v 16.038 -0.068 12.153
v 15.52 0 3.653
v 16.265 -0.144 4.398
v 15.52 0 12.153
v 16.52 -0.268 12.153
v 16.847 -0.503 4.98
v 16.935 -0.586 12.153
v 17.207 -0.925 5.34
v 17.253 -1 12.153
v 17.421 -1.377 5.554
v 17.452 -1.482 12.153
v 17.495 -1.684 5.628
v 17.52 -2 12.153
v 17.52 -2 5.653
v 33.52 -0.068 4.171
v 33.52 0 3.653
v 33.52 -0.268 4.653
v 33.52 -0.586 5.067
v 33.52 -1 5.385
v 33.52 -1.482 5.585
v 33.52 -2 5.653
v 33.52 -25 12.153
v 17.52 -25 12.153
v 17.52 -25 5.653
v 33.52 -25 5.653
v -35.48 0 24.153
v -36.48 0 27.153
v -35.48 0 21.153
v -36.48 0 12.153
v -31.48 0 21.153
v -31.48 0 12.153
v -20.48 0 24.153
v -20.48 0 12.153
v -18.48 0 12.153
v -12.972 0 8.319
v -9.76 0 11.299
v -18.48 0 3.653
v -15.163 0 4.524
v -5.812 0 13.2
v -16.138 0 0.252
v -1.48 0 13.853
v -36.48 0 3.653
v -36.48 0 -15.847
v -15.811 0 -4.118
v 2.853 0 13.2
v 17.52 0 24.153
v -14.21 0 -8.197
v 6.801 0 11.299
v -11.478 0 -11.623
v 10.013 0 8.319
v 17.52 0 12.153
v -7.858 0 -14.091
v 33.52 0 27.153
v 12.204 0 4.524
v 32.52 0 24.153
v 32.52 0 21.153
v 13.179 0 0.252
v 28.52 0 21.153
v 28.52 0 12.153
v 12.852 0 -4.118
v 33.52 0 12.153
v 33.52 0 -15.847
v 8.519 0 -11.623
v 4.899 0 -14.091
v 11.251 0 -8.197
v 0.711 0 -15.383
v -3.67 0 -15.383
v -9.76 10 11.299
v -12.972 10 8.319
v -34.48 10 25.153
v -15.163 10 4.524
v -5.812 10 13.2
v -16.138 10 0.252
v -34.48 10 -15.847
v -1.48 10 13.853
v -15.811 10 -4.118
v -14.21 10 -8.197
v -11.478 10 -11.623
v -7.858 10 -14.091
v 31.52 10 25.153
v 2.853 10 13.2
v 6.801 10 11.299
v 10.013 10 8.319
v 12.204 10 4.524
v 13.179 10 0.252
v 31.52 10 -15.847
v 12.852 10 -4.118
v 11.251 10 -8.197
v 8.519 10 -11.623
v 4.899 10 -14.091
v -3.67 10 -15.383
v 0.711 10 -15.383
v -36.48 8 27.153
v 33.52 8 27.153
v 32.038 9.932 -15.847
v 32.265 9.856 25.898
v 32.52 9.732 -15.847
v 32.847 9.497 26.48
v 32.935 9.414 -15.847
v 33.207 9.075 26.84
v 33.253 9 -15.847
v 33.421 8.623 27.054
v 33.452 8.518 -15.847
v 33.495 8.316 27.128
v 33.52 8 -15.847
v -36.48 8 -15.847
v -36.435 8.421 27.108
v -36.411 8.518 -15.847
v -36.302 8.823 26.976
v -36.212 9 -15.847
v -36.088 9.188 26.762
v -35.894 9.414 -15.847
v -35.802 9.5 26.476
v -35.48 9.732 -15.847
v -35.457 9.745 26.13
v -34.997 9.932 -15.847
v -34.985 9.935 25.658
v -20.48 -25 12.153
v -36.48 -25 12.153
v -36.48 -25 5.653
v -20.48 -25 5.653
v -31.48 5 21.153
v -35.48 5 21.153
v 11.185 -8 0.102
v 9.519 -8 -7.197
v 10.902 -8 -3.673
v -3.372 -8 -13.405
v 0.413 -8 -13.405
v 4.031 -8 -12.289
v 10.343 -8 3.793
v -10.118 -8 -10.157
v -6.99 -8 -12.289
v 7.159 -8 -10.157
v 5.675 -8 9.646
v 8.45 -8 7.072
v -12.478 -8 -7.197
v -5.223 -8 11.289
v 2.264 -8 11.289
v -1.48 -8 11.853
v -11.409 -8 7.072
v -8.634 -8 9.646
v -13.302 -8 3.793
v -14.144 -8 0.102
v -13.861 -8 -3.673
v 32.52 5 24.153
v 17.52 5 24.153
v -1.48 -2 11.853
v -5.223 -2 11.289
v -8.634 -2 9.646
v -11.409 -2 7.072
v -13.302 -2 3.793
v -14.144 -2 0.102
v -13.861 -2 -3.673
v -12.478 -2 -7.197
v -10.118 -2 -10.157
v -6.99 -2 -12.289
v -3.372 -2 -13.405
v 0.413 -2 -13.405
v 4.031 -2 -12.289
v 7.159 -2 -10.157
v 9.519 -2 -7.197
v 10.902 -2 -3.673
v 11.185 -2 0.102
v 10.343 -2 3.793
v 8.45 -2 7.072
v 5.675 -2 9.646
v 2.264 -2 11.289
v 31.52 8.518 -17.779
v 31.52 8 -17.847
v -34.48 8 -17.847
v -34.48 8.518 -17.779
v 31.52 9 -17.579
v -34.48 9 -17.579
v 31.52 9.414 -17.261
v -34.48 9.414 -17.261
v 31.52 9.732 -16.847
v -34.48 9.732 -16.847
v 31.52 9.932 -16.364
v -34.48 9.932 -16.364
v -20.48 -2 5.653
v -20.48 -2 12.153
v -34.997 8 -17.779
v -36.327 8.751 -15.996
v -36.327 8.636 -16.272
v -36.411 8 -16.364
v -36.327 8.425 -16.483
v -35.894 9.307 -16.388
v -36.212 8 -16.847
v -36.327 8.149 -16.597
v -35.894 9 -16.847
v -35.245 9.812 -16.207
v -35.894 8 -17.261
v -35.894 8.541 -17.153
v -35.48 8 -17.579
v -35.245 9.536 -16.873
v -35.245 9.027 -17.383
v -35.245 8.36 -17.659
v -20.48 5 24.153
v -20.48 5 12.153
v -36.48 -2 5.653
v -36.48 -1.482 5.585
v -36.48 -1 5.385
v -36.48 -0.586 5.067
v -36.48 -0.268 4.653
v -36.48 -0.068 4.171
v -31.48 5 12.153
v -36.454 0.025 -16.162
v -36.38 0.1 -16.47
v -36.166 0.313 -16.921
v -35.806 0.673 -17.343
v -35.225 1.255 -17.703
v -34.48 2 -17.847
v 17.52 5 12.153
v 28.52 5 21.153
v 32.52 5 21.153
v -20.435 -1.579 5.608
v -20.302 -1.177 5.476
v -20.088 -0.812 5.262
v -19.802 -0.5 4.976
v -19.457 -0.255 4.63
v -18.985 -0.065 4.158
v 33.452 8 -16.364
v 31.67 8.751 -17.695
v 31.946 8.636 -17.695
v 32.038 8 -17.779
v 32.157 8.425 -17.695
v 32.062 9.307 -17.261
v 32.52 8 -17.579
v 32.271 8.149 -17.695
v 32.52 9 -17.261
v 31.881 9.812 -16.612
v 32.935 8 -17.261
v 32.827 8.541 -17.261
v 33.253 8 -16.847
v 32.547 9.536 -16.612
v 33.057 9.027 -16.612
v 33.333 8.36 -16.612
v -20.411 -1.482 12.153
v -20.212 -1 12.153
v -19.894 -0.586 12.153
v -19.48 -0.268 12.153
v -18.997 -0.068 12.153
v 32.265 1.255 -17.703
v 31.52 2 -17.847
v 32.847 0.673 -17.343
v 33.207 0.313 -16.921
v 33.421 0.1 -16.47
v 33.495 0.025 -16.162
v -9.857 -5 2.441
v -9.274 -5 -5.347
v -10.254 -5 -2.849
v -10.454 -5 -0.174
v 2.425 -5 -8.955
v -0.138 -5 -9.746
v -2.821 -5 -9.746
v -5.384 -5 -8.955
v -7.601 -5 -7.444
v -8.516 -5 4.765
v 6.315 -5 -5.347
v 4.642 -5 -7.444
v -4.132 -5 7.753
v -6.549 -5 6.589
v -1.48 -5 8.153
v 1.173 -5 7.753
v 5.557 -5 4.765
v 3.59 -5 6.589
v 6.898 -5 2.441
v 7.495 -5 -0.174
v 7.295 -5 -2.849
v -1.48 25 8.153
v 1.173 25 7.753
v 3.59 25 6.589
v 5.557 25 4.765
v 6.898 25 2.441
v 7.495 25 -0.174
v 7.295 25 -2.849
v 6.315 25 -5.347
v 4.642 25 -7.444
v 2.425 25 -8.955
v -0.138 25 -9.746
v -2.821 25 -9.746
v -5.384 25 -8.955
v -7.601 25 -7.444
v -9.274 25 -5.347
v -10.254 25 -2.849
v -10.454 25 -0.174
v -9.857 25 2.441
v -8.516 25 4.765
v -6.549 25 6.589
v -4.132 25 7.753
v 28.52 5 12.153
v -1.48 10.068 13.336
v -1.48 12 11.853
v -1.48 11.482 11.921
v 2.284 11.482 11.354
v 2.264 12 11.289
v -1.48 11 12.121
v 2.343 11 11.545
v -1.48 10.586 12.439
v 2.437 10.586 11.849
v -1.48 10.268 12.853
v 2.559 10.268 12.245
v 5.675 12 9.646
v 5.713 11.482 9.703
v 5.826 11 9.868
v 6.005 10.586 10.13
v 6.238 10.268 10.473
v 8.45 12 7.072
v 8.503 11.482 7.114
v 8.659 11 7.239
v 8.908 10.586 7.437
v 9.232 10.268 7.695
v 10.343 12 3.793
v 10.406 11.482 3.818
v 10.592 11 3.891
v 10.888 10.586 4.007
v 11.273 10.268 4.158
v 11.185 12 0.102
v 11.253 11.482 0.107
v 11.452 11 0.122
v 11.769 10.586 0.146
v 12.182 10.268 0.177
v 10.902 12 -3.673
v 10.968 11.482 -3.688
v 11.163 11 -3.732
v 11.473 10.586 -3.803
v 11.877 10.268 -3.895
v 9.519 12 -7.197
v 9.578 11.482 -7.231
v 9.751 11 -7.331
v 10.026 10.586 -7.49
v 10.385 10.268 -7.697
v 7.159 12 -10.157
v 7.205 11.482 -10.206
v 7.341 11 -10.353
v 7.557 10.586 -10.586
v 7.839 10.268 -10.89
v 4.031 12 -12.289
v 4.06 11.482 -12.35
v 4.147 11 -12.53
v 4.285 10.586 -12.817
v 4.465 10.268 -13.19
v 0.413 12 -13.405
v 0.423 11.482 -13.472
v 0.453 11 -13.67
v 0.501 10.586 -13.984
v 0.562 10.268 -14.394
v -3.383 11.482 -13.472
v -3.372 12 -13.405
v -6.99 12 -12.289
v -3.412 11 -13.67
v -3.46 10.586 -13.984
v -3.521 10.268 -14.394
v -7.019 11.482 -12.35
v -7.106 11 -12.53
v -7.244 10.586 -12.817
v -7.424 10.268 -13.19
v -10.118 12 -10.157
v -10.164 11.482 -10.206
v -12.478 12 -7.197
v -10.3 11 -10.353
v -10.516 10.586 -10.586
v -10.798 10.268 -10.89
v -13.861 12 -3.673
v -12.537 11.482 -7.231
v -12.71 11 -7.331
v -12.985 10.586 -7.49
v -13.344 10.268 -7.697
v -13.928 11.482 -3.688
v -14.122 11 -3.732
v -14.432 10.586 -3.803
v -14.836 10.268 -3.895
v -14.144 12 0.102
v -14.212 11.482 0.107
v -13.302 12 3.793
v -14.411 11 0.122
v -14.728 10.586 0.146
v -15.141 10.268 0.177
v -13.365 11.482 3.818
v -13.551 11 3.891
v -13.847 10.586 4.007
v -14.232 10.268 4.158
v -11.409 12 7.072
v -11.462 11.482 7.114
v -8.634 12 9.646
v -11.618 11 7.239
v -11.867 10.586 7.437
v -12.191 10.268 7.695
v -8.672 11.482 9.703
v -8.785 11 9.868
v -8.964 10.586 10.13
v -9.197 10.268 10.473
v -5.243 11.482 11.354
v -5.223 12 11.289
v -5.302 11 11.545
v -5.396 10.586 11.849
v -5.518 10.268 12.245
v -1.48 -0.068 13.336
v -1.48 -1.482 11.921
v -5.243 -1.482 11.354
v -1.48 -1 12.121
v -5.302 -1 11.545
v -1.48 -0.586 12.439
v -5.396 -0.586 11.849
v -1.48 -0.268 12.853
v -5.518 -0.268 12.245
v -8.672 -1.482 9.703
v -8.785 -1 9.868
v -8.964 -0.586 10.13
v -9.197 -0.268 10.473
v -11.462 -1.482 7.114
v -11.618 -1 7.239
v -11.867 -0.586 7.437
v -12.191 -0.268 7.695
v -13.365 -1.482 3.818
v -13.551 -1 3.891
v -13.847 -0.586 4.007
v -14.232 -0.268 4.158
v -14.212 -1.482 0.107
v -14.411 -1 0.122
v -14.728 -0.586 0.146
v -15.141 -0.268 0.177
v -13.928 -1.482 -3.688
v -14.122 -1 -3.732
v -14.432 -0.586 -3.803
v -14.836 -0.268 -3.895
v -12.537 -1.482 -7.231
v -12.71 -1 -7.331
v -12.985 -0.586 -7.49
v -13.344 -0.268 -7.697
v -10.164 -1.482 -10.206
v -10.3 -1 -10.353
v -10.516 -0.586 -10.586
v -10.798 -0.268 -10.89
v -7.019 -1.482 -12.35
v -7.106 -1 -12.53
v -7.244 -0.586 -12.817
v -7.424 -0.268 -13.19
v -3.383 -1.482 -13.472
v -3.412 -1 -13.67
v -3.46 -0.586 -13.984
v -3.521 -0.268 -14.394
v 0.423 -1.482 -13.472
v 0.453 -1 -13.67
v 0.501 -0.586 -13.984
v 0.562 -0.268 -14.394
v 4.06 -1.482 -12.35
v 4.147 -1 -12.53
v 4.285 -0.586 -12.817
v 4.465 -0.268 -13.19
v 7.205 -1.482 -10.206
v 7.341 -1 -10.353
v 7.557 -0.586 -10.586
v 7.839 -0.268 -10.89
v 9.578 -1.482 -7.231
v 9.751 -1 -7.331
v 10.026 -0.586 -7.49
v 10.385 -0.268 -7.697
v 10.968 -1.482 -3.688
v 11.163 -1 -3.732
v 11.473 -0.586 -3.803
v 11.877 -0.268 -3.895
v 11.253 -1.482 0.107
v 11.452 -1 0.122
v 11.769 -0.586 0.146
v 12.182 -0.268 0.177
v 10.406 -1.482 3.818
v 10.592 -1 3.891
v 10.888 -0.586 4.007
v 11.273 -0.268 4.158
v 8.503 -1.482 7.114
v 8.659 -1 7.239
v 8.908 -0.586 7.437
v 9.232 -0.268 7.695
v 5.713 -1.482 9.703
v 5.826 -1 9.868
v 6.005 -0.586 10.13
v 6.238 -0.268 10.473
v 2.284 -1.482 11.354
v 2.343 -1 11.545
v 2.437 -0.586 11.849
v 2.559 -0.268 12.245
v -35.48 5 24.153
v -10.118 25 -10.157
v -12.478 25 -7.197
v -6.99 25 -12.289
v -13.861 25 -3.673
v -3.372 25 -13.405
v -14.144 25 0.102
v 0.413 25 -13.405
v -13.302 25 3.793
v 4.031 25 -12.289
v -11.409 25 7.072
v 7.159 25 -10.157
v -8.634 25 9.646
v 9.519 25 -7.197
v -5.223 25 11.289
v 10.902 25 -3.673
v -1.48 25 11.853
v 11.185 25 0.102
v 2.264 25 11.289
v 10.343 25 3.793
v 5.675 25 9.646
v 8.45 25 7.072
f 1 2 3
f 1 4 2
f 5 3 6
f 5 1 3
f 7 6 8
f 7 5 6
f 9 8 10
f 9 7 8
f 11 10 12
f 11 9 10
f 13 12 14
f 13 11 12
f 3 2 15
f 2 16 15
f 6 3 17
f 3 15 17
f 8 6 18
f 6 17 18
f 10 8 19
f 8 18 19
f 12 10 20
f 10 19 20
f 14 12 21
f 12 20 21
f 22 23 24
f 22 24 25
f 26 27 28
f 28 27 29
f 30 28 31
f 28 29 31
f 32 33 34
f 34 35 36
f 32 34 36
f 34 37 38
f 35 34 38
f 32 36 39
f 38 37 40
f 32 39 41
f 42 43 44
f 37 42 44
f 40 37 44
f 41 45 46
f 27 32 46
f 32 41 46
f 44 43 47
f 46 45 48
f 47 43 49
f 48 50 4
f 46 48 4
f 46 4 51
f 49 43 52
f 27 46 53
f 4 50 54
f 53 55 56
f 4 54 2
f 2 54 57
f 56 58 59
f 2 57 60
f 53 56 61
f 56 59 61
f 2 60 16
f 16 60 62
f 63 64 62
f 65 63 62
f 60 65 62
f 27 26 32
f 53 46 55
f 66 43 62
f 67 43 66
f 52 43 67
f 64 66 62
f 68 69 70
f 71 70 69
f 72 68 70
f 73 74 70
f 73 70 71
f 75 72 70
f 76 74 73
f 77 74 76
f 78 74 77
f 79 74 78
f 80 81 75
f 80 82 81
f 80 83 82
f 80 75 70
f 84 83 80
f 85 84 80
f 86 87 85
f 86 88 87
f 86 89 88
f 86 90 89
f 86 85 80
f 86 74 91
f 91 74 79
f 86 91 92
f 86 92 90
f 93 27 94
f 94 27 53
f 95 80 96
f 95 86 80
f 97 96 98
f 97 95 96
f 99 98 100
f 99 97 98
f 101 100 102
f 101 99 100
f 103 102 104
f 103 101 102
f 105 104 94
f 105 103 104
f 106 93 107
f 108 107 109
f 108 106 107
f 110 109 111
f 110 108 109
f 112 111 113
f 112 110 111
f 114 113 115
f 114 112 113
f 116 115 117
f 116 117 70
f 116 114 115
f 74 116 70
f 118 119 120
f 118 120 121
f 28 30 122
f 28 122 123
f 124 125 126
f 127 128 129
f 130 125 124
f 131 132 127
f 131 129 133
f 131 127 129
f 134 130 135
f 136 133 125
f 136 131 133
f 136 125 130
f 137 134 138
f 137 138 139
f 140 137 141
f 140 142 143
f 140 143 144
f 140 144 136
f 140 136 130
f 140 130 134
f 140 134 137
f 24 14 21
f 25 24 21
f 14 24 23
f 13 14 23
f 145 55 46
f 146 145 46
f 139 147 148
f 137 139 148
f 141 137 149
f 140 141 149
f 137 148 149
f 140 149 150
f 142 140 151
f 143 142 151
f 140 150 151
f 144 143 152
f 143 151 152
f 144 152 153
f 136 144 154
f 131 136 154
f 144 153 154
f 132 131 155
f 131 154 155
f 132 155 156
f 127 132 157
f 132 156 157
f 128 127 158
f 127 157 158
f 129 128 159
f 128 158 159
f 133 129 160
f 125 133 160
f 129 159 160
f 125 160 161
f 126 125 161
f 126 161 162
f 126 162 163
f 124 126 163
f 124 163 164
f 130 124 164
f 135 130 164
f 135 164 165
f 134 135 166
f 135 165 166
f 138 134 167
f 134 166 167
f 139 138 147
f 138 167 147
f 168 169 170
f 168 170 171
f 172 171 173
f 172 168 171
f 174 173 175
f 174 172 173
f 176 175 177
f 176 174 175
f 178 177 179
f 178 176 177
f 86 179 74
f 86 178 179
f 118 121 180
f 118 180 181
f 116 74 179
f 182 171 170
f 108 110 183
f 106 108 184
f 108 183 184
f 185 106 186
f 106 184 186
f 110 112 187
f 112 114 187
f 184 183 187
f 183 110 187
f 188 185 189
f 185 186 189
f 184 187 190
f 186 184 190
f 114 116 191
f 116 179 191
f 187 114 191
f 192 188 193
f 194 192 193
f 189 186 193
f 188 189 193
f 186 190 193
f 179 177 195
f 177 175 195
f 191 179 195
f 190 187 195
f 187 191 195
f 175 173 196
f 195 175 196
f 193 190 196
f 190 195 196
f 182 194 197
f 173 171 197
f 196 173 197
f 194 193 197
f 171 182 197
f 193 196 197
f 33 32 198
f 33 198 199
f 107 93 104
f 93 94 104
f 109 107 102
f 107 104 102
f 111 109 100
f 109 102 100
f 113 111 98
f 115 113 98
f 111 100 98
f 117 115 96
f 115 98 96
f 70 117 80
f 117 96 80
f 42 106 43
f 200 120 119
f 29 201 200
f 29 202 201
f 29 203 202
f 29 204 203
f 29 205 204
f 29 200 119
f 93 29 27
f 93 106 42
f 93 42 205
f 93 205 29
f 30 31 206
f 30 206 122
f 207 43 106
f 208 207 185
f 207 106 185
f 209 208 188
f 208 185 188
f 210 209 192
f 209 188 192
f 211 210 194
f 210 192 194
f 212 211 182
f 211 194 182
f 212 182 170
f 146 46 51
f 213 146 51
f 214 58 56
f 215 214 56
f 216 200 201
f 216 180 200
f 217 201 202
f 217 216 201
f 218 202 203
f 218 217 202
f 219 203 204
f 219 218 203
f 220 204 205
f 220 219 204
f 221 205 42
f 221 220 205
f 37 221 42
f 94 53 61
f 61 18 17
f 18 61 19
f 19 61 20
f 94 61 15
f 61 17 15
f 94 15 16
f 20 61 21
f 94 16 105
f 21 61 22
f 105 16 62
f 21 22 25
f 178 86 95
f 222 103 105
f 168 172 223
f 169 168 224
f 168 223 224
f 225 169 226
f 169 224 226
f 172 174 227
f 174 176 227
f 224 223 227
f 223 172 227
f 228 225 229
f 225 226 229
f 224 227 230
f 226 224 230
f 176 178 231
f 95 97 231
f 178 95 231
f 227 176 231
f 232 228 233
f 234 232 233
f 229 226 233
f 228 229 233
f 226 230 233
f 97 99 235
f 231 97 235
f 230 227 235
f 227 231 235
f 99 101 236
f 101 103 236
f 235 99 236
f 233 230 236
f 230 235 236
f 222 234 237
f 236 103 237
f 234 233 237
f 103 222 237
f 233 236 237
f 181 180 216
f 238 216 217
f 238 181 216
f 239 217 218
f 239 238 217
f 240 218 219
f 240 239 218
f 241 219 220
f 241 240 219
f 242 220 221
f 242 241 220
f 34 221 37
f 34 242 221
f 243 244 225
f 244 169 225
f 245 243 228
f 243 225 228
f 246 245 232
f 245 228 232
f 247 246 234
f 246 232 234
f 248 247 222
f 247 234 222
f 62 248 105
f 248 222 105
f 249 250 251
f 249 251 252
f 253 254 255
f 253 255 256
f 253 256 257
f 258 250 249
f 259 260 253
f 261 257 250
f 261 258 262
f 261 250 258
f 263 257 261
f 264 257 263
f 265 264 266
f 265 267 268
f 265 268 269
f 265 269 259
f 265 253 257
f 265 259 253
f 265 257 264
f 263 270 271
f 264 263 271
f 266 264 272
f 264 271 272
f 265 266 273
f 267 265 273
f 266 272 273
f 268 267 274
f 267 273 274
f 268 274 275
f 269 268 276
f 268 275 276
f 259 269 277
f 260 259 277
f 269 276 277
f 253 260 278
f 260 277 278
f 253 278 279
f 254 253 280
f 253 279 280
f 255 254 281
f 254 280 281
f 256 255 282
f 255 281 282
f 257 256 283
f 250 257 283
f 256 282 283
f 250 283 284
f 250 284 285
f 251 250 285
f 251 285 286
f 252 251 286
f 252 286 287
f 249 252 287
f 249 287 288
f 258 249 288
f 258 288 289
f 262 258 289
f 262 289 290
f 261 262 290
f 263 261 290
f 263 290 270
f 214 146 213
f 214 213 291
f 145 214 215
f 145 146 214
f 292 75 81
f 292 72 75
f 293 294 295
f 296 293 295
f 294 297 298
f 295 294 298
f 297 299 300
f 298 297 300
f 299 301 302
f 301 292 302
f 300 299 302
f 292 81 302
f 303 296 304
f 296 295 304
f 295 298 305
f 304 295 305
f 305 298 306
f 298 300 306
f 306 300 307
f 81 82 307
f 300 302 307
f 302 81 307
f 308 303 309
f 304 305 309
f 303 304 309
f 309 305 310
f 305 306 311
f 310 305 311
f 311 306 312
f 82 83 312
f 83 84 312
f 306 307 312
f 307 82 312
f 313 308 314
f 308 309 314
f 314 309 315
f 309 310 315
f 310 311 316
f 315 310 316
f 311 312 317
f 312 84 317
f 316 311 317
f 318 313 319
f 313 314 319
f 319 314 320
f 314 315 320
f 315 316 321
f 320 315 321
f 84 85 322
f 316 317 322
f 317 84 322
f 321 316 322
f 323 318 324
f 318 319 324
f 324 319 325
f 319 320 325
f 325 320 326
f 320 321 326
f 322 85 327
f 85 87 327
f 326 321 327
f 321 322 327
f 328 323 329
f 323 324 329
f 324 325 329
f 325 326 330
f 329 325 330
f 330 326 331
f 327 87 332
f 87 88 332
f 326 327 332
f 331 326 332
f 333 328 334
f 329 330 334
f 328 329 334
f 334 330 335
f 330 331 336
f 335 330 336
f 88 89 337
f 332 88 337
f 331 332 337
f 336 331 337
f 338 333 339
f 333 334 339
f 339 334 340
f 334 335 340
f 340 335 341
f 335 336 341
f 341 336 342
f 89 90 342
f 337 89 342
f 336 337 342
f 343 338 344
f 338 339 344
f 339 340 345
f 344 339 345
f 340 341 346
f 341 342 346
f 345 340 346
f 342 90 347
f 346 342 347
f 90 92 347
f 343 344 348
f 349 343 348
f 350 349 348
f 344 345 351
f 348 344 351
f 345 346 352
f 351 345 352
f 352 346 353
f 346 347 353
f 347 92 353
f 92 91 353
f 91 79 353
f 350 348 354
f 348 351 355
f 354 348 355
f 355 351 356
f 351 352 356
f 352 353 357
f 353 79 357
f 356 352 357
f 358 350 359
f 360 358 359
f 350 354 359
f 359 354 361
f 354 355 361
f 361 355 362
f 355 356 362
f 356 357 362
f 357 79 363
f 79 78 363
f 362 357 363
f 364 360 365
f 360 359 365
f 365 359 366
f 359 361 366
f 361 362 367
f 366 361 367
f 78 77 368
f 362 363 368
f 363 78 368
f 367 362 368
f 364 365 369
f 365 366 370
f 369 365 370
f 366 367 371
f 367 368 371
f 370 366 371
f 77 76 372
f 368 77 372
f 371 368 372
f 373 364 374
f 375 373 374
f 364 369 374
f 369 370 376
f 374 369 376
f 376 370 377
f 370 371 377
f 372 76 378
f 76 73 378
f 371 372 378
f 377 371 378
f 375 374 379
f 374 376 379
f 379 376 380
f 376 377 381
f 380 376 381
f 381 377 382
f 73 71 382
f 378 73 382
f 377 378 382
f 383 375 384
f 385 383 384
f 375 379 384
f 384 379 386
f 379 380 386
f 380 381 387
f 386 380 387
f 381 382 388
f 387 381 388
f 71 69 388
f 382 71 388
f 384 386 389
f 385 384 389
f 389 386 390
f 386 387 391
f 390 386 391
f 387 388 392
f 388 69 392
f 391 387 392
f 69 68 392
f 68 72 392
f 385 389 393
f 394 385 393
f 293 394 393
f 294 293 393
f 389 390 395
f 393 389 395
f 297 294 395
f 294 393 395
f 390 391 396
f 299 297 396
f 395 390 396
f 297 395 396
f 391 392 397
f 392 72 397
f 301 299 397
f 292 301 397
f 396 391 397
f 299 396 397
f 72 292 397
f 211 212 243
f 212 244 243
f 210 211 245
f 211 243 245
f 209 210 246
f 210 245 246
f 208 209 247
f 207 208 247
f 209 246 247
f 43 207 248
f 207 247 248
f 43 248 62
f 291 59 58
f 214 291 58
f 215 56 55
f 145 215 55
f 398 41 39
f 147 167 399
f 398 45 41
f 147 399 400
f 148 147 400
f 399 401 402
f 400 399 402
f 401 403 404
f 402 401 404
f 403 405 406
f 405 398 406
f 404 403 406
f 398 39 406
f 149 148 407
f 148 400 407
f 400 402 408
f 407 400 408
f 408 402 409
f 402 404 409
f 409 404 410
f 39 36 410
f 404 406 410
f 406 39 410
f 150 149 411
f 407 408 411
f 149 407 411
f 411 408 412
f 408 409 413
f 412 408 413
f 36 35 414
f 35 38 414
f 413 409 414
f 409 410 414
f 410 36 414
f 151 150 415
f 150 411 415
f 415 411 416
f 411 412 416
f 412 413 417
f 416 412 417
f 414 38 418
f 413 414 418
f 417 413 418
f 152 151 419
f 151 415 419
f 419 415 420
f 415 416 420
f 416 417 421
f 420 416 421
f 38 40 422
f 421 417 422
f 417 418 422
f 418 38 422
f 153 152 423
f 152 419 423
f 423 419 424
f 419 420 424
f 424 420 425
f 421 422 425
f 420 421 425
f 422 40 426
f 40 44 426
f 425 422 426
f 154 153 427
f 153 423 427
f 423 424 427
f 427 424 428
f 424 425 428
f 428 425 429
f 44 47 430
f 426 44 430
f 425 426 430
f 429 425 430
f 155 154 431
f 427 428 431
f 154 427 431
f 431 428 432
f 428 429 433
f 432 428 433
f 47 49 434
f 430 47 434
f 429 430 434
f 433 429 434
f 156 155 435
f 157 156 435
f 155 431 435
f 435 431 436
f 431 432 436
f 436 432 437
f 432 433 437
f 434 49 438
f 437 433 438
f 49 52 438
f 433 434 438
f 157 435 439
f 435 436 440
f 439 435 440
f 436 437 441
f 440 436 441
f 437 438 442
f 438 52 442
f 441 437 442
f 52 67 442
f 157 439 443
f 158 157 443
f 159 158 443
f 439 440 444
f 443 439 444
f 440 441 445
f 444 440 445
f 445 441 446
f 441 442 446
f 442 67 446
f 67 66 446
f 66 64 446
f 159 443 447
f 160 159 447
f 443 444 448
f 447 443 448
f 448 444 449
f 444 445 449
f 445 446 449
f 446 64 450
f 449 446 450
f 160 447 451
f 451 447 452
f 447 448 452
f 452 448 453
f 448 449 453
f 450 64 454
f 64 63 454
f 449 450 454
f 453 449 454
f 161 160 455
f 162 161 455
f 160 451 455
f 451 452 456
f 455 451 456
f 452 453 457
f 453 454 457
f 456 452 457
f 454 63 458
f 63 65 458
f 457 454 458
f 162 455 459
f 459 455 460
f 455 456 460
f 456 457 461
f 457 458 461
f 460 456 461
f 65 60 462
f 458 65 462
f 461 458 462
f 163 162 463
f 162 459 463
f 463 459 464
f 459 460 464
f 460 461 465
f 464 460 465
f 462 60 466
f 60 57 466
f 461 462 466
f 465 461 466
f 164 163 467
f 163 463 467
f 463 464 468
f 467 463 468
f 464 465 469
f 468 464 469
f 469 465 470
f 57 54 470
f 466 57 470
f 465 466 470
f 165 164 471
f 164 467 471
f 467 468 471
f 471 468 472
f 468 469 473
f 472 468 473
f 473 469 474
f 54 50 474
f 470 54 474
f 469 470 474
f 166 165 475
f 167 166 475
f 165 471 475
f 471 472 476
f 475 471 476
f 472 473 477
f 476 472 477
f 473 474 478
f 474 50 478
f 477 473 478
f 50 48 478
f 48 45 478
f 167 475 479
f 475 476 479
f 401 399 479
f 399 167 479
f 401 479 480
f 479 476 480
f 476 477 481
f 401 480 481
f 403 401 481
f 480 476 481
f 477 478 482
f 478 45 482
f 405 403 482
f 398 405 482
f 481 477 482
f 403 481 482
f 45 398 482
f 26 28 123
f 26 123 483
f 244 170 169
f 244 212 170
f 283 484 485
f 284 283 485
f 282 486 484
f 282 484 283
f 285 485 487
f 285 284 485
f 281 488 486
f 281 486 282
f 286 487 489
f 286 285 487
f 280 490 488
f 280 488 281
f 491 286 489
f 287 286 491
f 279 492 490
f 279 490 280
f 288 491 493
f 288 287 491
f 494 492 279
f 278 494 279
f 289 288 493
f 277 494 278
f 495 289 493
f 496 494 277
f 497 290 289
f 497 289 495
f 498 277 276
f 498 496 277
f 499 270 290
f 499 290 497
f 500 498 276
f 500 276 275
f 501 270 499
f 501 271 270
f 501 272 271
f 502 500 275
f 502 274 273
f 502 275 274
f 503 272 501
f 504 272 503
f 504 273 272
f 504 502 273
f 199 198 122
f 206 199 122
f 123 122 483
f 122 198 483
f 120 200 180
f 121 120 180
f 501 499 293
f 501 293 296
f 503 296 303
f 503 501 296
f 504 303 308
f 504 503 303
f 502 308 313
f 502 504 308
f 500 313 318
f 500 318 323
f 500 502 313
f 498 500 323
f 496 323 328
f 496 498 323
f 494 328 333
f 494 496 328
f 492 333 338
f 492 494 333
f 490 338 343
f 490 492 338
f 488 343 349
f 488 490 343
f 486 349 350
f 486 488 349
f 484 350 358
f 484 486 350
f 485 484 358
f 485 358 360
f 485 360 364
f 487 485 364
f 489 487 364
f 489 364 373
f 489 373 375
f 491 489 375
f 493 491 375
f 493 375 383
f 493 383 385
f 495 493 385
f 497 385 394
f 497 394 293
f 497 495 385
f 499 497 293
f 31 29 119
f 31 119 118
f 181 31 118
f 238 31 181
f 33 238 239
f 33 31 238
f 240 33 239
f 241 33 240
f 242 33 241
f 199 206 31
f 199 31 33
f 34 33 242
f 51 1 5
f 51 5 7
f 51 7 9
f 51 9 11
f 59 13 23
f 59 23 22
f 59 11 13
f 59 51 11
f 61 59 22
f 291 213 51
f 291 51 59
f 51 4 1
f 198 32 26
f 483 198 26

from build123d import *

# Parameters (mm, degrees)
SKETCH1_W           = 70
SKETCH1_H           = 45
BOSS_EXTRUDE1_DEPTH = 10
CUT_EXTRUDE1_DEPTH  = 5
FILLET1_R           = 2
SKETCH3_R           = 9
CUT_EXTRUDE3_DEPTH  = 25
BOSS_EXTRUDE2_START = 15
SKETCH5_R           = 12.7
SKETCH5_R_2         = 9
BOSS_EXTRUDE2_DEPTH = 15
FILLET2_R           = 2
SKETCH6_R           = 12.7
BOSS_EXTRUDE3_DEPTH = 8
FILLET3_R           = 2
SKETCH7_R           = 9
CUT_EXTRUDE4_DEPTH  = 5
SKETCH8_W           = 16
SKETCH8_H           = 6.5
BOSS_EXTRUDE4_DEPTH = 25
FILLET4_R           = 2


with BuildPart() as part:
    # Sketch1 → Boss-Extrude1 (new body)
    with BuildSketch(Plane(origin=(0, 0, 0), x_dir=(1, 0, 0), z_dir=(0, 1, 0))):
        with Locations((-1.479524439, -4.65323646)):
            Rectangle(SKETCH1_W, SKETCH1_H)
    extrude(amount=BOSS_EXTRUDE1_DEPTH)

    # Sketch2 → Cut-Extrude1 (cut)
    with BuildSketch(Plane.XZ):
        Polygon((28.520475561, 24.15323646), (17.520475561, 24.15323646), (17.520475561, 12.15323646), (28.520475561, 12.15323646), (28.520475561, 21.15323646), (32.520475561, 21.15323646), (32.520475561, 24.15323646), align=None)
        Polygon((-31.479524439, 21.15323646), (-35.479524439, 21.15323646), (-35.479524439, 24.15323646), (-31.479524439, 24.15323646), (-20.479524439, 24.15323646), (-20.479524439, 12.15323646), (-31.479524439, 12.15323646), align=None)
    extrude(amount=-CUT_EXTRUDE1_DEPTH, mode=Mode.SUBTRACT)

    # Fillet1
    fillet1_edges = [part.edges().sort_by_distance(p)[0] for p in [
        (33.520475561, 10, 4.65323646),
        (-1.479524439, 10, -17.84676354),
        (-36.479524439, 10, 4.65323646),
        (-1.479524439, 0, -17.84676354),
        (-36.479524439, 5, -17.84676354),
        (33.520475561, 5, -17.84676354),
        (-1.479524439, 10, 27.15323646),
    ]]
    fillet(fillet1_edges, radius=FILLET1_R)

    # Sketch3 → Cut-Extrude3 (cut)
    with BuildSketch(Plane(origin=(0, 10, 0), x_dir=(1, 0, 0), z_dir=(0, 1, 0))):
        with Locations(Location((-1.479524439, 0.84676354, 0), (0, 0, 270))):
            Circle(SKETCH3_R)
    extrude(amount=-CUT_EXTRUDE3_DEPTH, mode=Mode.SUBTRACT)

    # Sketch5 → Boss-Extrude2 (add)
    with BuildSketch(Plane(origin=(0, 10, 0), x_dir=(1, 0, 0), z_dir=(0, 1, 0)).offset(BOSS_EXTRUDE2_START)):
        with Locations(Location((-1.479524439, 0.84676354, 0), (0, 0, 270))):
            Circle(SKETCH5_R)
        with Locations(Location((-1.479524439, 0.84676354, 0), (0, 0, 270))):
            Circle(SKETCH5_R_2, mode=Mode.SUBTRACT)
    extrude(amount=-BOSS_EXTRUDE2_DEPTH)

    # Fillet2
    fillet2_edges = [part.edges().sort_by_distance(p)[0] for p in [
        (-1.479524439, 10, -13.54676354),
    ]]
    fillet(fillet2_edges, radius=FILLET2_R)

    # Sketch6 → Boss-Extrude3 (add)
    with BuildSketch(Plane.XZ):
        with Locations(Location((-1.479524439, -0.84676354, 0), (0, 0, 90))):
            Circle(SKETCH6_R)
    extrude(amount=BOSS_EXTRUDE3_DEPTH)

    # Fillet3
    fillet3_edges = [part.edges().sort_by_distance(p)[0] for p in [
        (-1.479524439, 0, -13.54676354),
    ]]
    fillet(fillet3_edges, radius=FILLET3_R)

    # Sketch7 → Cut-Extrude4 (cut)
    with BuildSketch(Plane(origin=(0, 0, 0), x_dir=(1, 0, 0), z_dir=(0, 1, 0))):
        with Locations(Location((-1.479524439, 0.84676354, 0), (0, 0, 270))):
            Circle(SKETCH7_R)
    extrude(amount=-CUT_EXTRUDE4_DEPTH, mode=Mode.SUBTRACT)

    # Sketch8 → Boss-Extrude4 (add)
    with BuildSketch(Plane.XZ):
        with Locations((-28.479524439, 8.90323646)):
            Rectangle(SKETCH8_W, SKETCH8_H)
        with Locations((25.520475561, 8.90323646)):
            Rectangle(SKETCH8_W, SKETCH8_H)
    extrude(amount=BOSS_EXTRUDE4_DEPTH)

    # Fillet4
    fillet4_edges = [part.edges().sort_by_distance(p)[0] for p in [
        (-20.479524439, 0, 8.90323646),
        (-28.479524439, 0, 5.65323646),
        (17.520475561, 0, 8.90323646),
        (25.520475561, 0, 5.65323646),
    ]]
    fillet(fillet4_edges, radius=FILLET4_R)


solid = part.part
